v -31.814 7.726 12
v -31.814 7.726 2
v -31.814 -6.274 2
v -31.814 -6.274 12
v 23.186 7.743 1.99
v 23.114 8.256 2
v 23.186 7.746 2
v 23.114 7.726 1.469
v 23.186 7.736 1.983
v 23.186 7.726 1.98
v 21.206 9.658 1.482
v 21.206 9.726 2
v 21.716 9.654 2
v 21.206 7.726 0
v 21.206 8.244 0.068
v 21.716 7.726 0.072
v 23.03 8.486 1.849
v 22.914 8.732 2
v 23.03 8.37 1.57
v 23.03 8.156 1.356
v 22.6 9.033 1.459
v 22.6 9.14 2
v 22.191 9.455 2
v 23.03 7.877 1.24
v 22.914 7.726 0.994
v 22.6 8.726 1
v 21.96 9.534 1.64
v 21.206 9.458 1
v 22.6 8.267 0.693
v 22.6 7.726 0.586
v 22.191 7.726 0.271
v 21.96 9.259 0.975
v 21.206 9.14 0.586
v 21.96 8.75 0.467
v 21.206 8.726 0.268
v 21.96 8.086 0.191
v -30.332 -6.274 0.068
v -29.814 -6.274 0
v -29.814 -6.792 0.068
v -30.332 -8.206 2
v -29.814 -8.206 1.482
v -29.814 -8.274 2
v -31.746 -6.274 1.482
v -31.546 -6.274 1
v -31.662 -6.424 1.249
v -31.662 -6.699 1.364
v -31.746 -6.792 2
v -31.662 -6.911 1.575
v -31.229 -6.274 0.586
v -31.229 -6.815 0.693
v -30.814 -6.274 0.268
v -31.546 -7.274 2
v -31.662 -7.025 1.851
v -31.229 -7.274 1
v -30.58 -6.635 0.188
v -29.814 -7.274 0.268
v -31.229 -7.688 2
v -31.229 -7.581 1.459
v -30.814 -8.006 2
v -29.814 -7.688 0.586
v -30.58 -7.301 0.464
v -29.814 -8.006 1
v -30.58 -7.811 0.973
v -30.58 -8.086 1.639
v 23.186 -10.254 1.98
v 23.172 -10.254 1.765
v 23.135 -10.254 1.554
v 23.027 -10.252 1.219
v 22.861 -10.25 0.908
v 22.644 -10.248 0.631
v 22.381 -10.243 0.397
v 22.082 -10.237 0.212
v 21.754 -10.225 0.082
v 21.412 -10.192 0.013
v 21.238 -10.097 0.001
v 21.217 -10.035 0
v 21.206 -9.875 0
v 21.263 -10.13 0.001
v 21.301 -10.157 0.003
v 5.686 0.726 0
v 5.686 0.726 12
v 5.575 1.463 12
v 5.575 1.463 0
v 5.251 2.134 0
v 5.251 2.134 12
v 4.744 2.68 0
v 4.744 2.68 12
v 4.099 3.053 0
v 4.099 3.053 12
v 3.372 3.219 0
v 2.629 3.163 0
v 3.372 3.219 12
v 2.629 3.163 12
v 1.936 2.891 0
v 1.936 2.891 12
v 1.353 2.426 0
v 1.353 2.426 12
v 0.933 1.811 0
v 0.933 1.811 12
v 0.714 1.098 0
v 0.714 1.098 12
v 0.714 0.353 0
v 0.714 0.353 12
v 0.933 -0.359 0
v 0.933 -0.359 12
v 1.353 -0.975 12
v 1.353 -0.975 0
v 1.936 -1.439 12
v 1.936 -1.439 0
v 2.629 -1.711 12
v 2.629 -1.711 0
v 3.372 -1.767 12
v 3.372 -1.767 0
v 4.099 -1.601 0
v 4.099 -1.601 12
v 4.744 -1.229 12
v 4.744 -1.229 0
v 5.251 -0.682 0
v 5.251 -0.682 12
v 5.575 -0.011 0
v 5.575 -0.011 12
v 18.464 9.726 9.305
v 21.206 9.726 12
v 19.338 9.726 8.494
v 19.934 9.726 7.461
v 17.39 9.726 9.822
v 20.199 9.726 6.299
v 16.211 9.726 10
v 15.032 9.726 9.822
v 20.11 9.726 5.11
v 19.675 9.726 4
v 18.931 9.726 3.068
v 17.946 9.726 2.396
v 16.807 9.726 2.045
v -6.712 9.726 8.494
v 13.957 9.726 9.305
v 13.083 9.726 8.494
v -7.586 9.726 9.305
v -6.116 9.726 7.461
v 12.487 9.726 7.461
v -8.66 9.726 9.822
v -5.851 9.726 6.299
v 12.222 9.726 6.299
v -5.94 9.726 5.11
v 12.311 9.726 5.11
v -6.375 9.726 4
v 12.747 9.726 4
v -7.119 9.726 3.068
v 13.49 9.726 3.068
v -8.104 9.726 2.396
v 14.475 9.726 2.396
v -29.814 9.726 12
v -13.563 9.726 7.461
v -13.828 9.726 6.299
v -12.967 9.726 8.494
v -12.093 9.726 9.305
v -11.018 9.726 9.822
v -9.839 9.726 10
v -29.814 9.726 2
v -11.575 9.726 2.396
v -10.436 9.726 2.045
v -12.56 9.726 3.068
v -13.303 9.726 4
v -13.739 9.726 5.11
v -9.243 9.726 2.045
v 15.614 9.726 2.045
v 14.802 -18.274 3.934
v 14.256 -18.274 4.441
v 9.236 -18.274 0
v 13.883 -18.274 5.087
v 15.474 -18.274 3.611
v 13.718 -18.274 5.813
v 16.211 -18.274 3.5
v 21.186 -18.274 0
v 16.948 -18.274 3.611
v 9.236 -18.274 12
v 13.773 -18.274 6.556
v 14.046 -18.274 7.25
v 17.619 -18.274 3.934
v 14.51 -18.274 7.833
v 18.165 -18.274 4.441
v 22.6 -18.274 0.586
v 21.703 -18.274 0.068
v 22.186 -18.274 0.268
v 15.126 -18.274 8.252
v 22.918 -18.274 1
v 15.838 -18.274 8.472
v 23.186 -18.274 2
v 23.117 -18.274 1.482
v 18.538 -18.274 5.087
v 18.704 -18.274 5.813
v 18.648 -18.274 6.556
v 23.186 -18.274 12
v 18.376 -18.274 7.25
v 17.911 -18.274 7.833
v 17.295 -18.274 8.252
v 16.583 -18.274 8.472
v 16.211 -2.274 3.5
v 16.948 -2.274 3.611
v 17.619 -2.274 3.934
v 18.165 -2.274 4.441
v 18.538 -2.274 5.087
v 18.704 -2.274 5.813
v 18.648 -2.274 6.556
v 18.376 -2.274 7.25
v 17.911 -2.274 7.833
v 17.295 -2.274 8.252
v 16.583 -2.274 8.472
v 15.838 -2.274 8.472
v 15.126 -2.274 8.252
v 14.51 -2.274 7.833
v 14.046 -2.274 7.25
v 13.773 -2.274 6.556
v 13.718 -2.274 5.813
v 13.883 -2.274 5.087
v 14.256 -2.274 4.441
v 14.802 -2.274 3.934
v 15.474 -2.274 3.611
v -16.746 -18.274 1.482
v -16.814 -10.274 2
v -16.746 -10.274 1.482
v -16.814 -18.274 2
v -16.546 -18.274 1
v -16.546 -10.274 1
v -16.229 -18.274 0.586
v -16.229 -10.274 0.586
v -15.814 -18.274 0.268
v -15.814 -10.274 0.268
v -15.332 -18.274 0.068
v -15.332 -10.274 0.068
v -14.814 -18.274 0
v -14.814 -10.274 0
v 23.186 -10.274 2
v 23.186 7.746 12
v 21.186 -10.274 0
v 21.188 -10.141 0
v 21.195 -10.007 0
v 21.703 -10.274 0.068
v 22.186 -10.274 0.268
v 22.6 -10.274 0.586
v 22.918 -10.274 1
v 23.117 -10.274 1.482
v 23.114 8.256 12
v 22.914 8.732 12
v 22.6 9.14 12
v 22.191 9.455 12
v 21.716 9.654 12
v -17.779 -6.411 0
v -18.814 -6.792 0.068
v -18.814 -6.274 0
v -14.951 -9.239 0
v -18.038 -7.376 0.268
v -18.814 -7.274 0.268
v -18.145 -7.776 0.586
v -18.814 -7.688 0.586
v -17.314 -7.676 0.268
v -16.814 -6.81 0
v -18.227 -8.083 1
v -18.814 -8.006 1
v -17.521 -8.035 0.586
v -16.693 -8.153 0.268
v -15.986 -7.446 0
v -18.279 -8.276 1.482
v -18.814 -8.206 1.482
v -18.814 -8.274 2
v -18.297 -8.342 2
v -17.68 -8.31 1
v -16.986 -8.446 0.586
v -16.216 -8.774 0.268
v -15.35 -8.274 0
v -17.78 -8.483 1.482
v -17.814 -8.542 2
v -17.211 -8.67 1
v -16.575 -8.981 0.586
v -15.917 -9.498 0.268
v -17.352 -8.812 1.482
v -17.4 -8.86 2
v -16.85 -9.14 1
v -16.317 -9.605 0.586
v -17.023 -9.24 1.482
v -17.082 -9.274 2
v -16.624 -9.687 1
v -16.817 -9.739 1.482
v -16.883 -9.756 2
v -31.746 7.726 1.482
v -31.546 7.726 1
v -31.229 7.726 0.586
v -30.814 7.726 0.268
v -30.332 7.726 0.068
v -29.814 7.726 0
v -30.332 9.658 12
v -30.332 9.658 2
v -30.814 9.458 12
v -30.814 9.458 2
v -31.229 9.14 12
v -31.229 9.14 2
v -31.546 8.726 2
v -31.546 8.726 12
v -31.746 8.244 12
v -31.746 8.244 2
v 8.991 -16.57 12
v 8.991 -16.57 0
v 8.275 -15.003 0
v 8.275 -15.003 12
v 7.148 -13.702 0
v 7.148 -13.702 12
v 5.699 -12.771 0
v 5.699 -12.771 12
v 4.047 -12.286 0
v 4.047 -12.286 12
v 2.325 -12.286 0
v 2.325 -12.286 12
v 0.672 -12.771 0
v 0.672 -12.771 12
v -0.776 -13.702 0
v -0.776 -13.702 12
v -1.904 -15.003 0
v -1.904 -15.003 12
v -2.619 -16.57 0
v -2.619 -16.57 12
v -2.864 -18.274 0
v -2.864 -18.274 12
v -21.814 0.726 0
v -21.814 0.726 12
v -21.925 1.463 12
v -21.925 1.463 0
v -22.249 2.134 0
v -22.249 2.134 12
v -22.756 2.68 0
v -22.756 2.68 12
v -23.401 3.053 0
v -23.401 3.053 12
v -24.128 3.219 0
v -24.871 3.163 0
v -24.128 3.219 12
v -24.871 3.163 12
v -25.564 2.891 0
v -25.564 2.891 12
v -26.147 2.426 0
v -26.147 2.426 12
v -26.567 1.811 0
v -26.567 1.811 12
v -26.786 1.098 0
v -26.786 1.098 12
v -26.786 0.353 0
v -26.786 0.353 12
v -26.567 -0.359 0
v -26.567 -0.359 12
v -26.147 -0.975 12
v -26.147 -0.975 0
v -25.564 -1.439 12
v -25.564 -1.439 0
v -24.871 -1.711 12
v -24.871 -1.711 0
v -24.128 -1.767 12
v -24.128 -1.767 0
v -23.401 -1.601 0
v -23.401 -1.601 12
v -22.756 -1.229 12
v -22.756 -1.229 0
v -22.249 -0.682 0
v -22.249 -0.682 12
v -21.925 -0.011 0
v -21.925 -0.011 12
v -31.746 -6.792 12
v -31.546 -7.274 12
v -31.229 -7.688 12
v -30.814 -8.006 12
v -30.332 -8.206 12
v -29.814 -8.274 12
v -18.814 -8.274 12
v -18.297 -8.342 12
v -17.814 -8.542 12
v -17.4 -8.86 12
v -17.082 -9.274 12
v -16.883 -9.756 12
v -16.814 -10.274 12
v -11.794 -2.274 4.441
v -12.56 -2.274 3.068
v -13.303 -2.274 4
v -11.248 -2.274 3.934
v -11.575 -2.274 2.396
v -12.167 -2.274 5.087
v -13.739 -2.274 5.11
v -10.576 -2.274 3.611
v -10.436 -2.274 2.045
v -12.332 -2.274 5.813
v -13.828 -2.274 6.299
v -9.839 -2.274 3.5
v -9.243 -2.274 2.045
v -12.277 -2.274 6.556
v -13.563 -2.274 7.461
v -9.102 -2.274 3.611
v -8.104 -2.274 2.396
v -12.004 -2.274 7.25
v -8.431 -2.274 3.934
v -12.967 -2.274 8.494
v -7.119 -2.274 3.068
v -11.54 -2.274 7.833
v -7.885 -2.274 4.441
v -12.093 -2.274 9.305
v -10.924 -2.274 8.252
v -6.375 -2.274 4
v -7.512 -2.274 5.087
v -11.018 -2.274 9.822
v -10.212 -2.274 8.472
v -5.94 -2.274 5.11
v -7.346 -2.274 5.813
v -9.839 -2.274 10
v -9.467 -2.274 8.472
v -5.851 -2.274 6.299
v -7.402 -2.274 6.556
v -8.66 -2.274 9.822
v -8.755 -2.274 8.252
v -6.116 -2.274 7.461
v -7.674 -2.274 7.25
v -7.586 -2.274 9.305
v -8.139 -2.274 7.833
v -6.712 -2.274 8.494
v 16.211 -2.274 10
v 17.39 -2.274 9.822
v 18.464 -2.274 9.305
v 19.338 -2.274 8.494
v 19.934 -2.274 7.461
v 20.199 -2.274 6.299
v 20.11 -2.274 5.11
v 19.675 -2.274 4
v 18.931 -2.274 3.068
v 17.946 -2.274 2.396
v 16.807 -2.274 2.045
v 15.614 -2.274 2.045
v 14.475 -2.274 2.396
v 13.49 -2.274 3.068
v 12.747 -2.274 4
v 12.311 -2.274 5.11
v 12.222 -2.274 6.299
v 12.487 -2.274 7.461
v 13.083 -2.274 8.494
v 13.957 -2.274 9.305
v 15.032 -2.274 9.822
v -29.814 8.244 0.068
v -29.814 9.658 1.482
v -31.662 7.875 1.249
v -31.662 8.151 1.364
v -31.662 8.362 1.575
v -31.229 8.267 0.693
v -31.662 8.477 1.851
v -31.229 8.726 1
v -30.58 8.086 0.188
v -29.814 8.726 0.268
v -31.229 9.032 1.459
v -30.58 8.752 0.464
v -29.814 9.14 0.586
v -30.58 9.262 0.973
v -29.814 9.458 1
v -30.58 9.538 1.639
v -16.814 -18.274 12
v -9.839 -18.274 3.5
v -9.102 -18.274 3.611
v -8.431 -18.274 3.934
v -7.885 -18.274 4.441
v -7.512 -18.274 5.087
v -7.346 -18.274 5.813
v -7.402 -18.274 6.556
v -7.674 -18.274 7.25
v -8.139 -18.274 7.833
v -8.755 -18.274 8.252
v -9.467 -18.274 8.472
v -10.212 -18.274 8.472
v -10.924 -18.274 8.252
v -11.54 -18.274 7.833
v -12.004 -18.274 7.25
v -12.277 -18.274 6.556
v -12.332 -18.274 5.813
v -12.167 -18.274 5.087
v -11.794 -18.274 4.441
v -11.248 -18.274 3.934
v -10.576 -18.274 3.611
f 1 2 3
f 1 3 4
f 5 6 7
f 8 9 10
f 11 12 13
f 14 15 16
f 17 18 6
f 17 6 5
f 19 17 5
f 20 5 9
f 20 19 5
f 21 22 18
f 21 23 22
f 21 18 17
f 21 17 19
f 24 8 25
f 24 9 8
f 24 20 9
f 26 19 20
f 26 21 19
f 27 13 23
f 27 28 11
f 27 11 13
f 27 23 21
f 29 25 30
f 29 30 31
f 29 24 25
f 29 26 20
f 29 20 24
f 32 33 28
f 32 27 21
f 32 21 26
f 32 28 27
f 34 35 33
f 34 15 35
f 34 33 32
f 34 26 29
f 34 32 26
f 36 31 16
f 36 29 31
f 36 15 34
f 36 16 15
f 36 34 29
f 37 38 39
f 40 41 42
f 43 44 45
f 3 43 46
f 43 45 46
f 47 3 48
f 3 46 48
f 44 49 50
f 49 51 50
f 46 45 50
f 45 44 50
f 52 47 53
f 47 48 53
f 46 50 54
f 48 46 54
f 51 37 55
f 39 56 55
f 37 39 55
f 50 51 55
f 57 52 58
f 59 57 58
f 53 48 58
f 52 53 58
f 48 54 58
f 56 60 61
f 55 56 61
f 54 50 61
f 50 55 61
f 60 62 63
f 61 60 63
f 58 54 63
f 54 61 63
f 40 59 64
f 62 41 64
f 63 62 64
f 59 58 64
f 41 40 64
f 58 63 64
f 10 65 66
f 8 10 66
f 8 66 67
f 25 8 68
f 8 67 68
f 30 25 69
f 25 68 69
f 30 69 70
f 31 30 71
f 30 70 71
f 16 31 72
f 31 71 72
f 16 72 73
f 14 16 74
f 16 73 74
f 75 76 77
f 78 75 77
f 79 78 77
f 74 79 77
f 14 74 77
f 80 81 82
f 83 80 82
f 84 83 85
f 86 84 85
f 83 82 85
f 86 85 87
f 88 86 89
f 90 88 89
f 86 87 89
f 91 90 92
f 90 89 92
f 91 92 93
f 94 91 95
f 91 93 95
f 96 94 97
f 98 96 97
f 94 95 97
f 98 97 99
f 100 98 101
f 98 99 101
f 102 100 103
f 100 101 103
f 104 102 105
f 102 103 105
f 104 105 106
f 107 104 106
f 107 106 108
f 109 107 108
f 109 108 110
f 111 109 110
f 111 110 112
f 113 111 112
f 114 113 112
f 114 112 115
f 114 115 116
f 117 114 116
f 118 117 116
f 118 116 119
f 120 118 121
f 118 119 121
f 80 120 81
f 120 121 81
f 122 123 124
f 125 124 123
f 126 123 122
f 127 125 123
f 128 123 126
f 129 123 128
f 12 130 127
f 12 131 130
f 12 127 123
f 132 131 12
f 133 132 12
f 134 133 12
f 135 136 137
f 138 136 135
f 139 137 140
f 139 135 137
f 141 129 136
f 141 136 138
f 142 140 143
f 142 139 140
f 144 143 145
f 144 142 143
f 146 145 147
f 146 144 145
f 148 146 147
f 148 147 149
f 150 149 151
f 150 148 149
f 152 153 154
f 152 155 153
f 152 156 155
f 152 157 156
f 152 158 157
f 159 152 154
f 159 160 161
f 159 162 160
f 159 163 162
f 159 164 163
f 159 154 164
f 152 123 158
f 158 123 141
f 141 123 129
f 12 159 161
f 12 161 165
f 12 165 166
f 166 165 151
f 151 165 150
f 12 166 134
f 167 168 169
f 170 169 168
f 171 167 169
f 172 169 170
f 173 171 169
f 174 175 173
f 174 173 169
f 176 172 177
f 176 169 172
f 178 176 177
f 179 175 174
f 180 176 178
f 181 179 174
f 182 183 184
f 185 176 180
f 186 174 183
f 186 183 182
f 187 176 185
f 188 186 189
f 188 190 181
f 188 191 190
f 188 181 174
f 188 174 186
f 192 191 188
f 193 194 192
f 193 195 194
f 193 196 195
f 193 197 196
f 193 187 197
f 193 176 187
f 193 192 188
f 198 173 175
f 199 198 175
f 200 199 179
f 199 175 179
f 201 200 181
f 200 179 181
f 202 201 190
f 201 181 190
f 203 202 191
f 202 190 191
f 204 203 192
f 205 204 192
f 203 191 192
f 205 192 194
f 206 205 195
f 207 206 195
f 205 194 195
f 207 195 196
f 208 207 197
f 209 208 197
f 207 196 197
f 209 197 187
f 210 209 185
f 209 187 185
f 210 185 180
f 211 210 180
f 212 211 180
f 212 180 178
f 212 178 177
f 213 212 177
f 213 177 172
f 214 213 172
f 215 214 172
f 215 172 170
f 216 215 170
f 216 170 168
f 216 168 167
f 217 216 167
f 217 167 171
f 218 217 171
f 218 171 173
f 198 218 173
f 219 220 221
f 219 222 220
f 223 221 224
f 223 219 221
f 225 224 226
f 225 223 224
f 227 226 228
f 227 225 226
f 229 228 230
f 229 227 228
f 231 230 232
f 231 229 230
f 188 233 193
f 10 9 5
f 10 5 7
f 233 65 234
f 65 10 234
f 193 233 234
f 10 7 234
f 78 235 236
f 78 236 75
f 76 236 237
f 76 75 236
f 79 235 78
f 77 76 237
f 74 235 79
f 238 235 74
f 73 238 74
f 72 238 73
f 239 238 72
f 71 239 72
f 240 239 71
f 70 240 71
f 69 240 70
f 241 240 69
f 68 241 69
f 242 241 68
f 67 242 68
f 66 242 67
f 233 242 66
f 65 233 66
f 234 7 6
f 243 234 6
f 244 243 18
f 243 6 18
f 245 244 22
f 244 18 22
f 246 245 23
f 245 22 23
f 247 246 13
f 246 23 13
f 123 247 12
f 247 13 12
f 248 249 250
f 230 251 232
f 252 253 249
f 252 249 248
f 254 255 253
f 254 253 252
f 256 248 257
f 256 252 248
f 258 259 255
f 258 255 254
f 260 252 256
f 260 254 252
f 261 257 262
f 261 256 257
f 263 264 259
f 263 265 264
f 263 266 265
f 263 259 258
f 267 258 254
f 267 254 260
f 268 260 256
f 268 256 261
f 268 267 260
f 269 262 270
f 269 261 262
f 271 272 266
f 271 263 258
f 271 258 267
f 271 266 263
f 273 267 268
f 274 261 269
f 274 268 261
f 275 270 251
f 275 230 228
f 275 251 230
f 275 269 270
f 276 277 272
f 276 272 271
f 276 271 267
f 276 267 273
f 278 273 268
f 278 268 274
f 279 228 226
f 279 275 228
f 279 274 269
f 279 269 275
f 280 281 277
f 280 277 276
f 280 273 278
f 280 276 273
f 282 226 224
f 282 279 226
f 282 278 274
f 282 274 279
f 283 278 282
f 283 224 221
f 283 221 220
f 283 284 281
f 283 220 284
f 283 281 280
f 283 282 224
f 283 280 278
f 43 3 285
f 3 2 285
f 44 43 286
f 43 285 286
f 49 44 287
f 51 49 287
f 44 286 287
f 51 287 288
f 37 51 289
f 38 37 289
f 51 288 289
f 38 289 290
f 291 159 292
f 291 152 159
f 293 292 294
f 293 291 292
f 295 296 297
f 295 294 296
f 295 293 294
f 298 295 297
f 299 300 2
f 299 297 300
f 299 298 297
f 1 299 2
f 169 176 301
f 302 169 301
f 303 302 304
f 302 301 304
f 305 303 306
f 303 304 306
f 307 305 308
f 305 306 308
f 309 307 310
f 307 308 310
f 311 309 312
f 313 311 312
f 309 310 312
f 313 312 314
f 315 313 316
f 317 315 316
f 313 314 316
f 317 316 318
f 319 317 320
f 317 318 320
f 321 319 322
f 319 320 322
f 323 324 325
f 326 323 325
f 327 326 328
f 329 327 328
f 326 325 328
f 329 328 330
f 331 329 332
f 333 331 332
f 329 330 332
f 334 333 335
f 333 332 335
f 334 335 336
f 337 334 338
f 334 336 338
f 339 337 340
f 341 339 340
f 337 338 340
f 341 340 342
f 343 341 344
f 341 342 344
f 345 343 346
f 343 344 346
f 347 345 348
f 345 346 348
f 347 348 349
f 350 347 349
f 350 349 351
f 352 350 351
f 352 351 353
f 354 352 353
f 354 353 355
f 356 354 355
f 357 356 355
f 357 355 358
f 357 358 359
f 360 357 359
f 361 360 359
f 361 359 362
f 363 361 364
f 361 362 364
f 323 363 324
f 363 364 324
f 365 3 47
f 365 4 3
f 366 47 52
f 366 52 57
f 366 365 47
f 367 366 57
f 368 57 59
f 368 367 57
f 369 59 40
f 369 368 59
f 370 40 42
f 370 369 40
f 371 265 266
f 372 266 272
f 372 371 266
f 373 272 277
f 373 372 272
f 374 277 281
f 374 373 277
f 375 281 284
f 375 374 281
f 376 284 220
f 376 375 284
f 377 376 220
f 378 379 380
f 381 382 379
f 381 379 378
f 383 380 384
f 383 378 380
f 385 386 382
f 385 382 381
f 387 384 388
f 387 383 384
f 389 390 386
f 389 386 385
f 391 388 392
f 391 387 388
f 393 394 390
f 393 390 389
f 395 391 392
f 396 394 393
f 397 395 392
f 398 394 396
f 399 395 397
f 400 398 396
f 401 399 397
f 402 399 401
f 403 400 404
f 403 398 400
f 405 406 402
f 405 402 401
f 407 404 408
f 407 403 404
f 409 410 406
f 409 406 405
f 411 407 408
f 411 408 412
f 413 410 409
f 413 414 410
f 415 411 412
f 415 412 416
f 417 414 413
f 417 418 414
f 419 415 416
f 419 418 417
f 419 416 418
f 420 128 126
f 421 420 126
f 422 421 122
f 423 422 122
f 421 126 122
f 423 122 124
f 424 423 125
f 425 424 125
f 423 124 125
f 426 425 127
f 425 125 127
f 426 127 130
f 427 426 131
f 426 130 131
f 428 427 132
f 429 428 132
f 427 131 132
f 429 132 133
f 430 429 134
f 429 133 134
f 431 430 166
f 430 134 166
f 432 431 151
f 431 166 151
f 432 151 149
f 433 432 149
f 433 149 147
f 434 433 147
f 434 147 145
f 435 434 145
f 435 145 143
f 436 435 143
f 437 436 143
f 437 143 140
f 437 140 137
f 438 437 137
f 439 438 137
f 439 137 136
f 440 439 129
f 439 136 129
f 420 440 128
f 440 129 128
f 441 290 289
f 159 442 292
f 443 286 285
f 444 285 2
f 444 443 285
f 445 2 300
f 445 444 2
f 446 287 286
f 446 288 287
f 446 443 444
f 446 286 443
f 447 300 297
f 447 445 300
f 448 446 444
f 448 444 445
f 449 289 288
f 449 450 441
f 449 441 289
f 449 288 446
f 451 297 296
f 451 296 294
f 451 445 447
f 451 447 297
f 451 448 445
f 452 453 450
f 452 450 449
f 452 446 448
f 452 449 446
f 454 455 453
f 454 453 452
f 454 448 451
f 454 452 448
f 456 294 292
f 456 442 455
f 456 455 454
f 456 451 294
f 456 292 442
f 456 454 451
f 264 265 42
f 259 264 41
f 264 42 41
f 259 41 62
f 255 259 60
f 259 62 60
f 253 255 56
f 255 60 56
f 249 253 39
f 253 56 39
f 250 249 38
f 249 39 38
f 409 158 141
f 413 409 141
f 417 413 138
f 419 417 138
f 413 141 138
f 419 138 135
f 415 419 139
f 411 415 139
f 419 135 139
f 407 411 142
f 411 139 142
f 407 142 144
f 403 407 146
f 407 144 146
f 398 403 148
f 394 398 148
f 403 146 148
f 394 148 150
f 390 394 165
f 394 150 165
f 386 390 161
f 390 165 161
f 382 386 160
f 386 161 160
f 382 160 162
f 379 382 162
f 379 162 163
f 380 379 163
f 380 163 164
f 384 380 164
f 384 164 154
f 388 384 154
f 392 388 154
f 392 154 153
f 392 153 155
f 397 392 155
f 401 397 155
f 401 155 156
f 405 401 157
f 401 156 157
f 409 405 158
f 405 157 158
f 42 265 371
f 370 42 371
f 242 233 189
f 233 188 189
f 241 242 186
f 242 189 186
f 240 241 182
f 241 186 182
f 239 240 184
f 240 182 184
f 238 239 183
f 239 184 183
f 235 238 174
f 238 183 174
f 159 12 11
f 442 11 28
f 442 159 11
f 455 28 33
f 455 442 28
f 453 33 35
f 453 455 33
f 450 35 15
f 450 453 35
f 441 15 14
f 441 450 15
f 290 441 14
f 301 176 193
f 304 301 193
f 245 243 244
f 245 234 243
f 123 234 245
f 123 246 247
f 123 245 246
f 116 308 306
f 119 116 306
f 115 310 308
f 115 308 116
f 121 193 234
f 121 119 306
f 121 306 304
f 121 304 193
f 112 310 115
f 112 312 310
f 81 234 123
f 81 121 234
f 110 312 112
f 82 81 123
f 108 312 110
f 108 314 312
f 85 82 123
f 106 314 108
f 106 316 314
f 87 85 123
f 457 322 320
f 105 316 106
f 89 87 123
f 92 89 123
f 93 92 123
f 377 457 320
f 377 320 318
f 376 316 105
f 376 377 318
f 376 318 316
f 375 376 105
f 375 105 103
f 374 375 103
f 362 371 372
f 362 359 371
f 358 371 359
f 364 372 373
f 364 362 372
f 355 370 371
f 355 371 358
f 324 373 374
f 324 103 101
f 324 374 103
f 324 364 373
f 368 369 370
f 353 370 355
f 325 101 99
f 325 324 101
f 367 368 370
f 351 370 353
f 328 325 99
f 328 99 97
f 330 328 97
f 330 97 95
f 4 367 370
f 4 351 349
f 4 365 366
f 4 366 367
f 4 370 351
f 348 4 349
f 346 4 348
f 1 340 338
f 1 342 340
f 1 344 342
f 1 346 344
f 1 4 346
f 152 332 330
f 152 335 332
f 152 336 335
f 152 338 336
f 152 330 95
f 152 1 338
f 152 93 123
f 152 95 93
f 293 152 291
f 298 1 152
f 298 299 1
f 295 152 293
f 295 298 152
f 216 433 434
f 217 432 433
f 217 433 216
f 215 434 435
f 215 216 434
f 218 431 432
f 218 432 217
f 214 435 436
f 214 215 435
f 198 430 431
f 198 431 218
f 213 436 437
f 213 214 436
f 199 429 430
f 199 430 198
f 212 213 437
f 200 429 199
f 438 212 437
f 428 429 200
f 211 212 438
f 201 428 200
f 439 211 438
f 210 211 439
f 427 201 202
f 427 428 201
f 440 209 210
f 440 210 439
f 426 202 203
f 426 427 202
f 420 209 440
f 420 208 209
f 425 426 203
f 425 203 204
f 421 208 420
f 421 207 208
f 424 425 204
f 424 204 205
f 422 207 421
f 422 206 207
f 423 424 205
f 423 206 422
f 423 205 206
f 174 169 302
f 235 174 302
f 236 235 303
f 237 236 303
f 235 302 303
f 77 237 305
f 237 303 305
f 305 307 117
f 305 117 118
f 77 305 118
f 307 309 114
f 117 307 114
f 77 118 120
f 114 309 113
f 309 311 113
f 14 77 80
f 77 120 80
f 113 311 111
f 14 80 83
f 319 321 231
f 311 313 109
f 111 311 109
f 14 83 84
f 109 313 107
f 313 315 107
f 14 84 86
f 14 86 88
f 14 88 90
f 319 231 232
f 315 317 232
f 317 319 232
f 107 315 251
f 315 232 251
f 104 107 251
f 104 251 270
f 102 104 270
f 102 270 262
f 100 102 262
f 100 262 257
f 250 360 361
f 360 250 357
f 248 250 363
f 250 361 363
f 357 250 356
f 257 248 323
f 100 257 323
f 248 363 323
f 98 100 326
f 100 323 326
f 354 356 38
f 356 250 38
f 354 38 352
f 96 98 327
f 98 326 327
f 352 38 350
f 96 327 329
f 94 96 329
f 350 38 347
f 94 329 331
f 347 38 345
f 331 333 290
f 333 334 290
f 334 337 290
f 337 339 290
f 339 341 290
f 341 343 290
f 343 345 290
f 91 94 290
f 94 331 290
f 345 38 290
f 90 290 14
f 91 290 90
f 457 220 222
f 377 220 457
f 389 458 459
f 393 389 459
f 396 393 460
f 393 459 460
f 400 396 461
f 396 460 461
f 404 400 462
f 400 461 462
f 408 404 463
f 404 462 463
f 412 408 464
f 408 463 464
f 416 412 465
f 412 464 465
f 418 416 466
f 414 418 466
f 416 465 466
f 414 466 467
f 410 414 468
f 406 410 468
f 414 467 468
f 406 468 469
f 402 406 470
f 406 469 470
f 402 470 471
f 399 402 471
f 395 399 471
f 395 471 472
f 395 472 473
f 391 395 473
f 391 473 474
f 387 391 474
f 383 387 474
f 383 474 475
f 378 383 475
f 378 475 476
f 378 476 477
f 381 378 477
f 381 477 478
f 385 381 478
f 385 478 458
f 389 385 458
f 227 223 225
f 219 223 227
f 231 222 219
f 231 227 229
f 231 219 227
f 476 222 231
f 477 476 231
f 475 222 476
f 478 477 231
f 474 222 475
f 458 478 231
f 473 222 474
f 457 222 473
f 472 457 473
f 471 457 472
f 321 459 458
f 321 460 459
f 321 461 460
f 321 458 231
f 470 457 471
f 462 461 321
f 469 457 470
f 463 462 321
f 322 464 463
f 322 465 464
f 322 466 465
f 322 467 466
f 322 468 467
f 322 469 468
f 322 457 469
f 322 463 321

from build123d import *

# Parameters (mm, degrees)
ESQUISSE1_W                  = 40
ESQUISSE1_H                  = 18
BOSS_EXTRU_1_DEPTH           = 12
ESQUISSE2_W                  = 40
ESQUISSE2_H                  = 12
BOSS_EXTRU_2_DEPTH           = 10
ENL_V_MAT_EXTRU_1_DEPTH      = 12
ESQUISSE4_R                  = 2.5
ENL_V_MAT_EXTRU_2_DEPTH      = 28
ESQUISSE5_R                  = 2.5
ENL_V_MAT_EXTRU_3_DEPTH      = 12
ESQUISSE6_R                  = 4
ENL_V_MAT_EXTRU_5_DEPTH      = 12
ESQUISSE7_W                  = 12
ESQUISSE7_H                  = 18
BOSS_EXTRU_3_DEPTH           = 15
ESQUISSE8_W                  = 12
ESQUISSE8_H                  = 18
BOSS_EXTRU_4_DEPTH           = 15
ESQUISSE9_R                  = 2.5
ENL_V_MAT_EXTRU_6_DEPTH      = 12
CONG_1_R                     = 2
ENL_V_MAT_EXTRU_7_DEPTH      = 10
ENL_V_MAT_EXTRU_7_DEPTH_BACK = 27
ESQUISSE11_W                 = 15
ESQUISSE11_H                 = 16.6984892
CONG_2_R                     = 2


# Some blends are built 0.0001 mm under size
with BuildPart() as part:
    # Esquisse1 → Boss.-Extru.1 (new body)
    with BuildSketch(Plane.XY):
        with Locations((3.185612757, 0.725848564)):
            Rectangle(ESQUISSE1_W, ESQUISSE1_H)
    extrude(amount=BOSS_EXTRU_1_DEPTH)

    # Esquisse2 → Boss.-Extru.2 (add)
    with BuildSketch(Plane.XZ.offset(8.274151436)):
        with Locations((3.185612757, 6)):
            Rectangle(ESQUISSE2_W, ESQUISSE2_H)
    extrude(amount=BOSS_EXTRU_2_DEPTH)

    # Esquisse3 → Enlèv. mat.-Extru.1 (cut)
    with BuildSketch(Plane.XY.offset(12)):
        with BuildLine():
            Line((-2.864387243, -18.274151436), (9.235612757, -18.274151436))
            ThreePointArc((9.235612757, -18.274151436), (3.185612757, -12.224151436), (-2.864387243, -18.274151436))
        make_face()
    extrude(amount=-ENL_V_MAT_EXTRU_1_DEPTH, mode=Mode.SUBTRACT)

    # Esquisse4 → Enlèv. mat.-Extru.2 (cut)
    with BuildSketch(Plane.XZ.offset(18.274151436)):
        with Locations(Location((-9.839387243, 6, 0), (0, 0, 270))):
            Circle(ESQUISSE4_R)
        with Locations(Location((16.210612757, 6, 0), (0, 0, 270))):
            Circle(ESQUISSE4_R)
    extrude(amount=-ENL_V_MAT_EXTRU_2_DEPTH, mode=Mode.SUBTRACT)

    # Esquisse5 → Enlèv. mat.-Extru.3 (cut)
    with BuildSketch(Plane.XY.offset(12)):
        with Locations((3.185612757, 0.725848564)):
            Circle(ESQUISSE5_R)
    extrude(amount=-ENL_V_MAT_EXTRU_3_DEPTH, mode=Mode.SUBTRACT)

    # Esquisse6 → Enlèv. mat.-Extru.5 (cut)
    with BuildSketch(Plane(origin=(0, 9.725848564, 0), x_dir=(1, 0, 0), z_dir=(0, 1, 0))):
        with Locations(Location((16.210612757, -6, 0), (0, 0, 270))):
            Circle(ESQUISSE6_R)
        with Locations(Location((-9.839387243, -6, 0), (0, 0, 270))):
            Circle(ESQUISSE6_R)
    extrude(amount=-ENL_V_MAT_EXTRU_5_DEPTH, mode=Mode.SUBTRACT)

    # Esquisse7 → Boss.-Extru.3 (add)
    with BuildSketch(Plane.ZY.offset(16.814387243)):
        with Locations((6, 0.725848564)):
            Rectangle(ESQUISSE7_W, ESQUISSE7_H)
    extrude(amount=BOSS_EXTRU_3_DEPTH)

    # Esquisse8 → Boss.-Extru.4 (add)
    with BuildSketch(Plane(origin=(23.185612757, 0, 0), x_dir=(0, 0, -1), z_dir=(1, 0, 0))):
        with Locations((-6, 0.725848564)):
            Rectangle(ESQUISSE8_W, ESQUISSE8_H)
    extrude(amount=BOSS_EXTRU_4_DEPTH)

    # Esquisse9 → Enlèv. mat.-Extru.6 (cut)
    with BuildSketch(Plane.XY.offset(12)):
        with Locations((-24.314387243, 0.725848564)):
            Circle(ESQUISSE9_R)
        with Locations((30.685612757, 0.725848564)):
            Circle(ESQUISSE9_R)
    extrude(amount=-ENL_V_MAT_EXTRU_6_DEPTH, mode=Mode.SUBTRACT)

    # Congé1
    cong_1_edges = [part.edges().sort_by_distance(p)[0] for p in [
        (3.185612757, 9.725848564, 0),
        (23.185612757, -13.274151436, 0),
        (-16.814387243, -13.274151436, 0),
        (-16.814387243, -8.274151436, 6),
        (-24.314387243, -8.274151436, 0),
        (-31.814387243, 0.725848564, 0),
        (-31.814387243, -8.274151436, 6),
        (-31.814387243, 9.725848564, 6),
        (30.685612757, -8.274151436, 0),
        (23.185612757, -8.274151436, 6),
        (38.185612757, 0.725848564, 0),
        (38.185612757, 9.725848564, 6),
        (38.185612757, -8.274151436, 6),
    ]]
    fillet(cong_1_edges, radius=CONG_1_R - 0.0001)  # a hair under: the kernel refuses the full size

    # Esquisse11 → Enlèv. mat.-Extru.7 (cut, two sides: drawn at the far end of the back side and taken through both)
    with BuildSketch(Plane.XZ.offset(8.274151436).offset(-ENL_V_MAT_EXTRU_7_DEPTH_BACK)):
        with Locations((30.685612757, 5.475380595)):
            Rectangle(ESQUISSE11_W, ESQUISSE11_H)
    extrude(amount=ENL_V_MAT_EXTRU_7_DEPTH + ENL_V_MAT_EXTRU_7_DEPTH_BACK, mode=Mode.SUBTRACT)

    # Congé2
    # the kernel refuses this fillet: 2 mm, written as the material it takes off along each edge
    with BuildSketch(Plane(origin=(23.185612757, 9.725848564, 1.9999), x_dir=(-0.999999998749875, 5.00025000614922e-05, 0), z_dir=(0, 0, 1))) as cong_2_piece_1:
        with BuildLine():
            CenterArc((1.999799997, 1.999999997), CONG_2_R, 180.002864932, 90)
            Line((-0.0002, 1.999899992), (-0.0402, 1.999897992))
            ThreePointArc((-0.0402, 1.999897992), (-0.04005, 0.999947999), (-0.04, -2e-06))
            Line((-0.04, -2e-06), (2e-06, -0.04))
            ThreePointArc((2e-06, -0.04), (0.999951999, -0.03995), (1.999902003, -0.04))
            Line((1.999902003, -0.04), (1.999900003, 0))
        make_face()
    extrude(amount=14.999850006, mode=Mode.SUBTRACT)
    with BuildSketch(Plane(origin=(23.185612757, 7.725948564, 1.9999), x_dir=(0, 1, 0), z_dir=(0, 0, 1))) as cong_2_piece_2:
        with BuildLine():
            CenterArc((0, 1.9999), CONG_2_R, 270, 90)
            Line((2, 1.9999), (2.04, 1.9999))
            ThreePointArc((2.04, 1.9999), (2.0399, 0.99995), (2.0399, 0))
            Line((2.0399, 0), (1.9999, -0.04))
            ThreePointArc((1.9999, -0.04), (0.99995, -0.04), (0, -0.0401))
            Line((0, -0.0401), (0, -0.0001))
        make_face()
    revolve(axis=Axis((23.185612757, 7.725948564, 1.9999), (-1, 0, 0)), revolution_arc=90, mode=Mode.SUBTRACT)
    with BuildSketch(Plane(origin=(23.185612757, -11.809873032, 0), x_dir=(-0.999999998749875, 0, -5.000250006249136e-05), z_dir=(0, 1, 0))) as cong_2_piece_3:
        with BuildLine():
            CenterArc((1.999799998, 1.999999997), CONG_2_R, 180.002864932, 90)
            Line((-0.0002, 1.999899992), (-0.0402, 1.999897992))
            ThreePointArc((-0.0402, 1.999897992), (-0.04005, 0.999947999), (-0.04, -2e-06))
            Line((-0.04, -2e-06), (2e-06, -0.04))
            ThreePointArc((2e-06, -0.04), (0.999951999, -0.03995), (1.999902003, -0.04))
            Line((1.999902003, -0.04), (1.999900003, 0))
        make_face()
    extrude(amount=19.535821596, mode=Mode.SUBTRACT)


solid = part.part
